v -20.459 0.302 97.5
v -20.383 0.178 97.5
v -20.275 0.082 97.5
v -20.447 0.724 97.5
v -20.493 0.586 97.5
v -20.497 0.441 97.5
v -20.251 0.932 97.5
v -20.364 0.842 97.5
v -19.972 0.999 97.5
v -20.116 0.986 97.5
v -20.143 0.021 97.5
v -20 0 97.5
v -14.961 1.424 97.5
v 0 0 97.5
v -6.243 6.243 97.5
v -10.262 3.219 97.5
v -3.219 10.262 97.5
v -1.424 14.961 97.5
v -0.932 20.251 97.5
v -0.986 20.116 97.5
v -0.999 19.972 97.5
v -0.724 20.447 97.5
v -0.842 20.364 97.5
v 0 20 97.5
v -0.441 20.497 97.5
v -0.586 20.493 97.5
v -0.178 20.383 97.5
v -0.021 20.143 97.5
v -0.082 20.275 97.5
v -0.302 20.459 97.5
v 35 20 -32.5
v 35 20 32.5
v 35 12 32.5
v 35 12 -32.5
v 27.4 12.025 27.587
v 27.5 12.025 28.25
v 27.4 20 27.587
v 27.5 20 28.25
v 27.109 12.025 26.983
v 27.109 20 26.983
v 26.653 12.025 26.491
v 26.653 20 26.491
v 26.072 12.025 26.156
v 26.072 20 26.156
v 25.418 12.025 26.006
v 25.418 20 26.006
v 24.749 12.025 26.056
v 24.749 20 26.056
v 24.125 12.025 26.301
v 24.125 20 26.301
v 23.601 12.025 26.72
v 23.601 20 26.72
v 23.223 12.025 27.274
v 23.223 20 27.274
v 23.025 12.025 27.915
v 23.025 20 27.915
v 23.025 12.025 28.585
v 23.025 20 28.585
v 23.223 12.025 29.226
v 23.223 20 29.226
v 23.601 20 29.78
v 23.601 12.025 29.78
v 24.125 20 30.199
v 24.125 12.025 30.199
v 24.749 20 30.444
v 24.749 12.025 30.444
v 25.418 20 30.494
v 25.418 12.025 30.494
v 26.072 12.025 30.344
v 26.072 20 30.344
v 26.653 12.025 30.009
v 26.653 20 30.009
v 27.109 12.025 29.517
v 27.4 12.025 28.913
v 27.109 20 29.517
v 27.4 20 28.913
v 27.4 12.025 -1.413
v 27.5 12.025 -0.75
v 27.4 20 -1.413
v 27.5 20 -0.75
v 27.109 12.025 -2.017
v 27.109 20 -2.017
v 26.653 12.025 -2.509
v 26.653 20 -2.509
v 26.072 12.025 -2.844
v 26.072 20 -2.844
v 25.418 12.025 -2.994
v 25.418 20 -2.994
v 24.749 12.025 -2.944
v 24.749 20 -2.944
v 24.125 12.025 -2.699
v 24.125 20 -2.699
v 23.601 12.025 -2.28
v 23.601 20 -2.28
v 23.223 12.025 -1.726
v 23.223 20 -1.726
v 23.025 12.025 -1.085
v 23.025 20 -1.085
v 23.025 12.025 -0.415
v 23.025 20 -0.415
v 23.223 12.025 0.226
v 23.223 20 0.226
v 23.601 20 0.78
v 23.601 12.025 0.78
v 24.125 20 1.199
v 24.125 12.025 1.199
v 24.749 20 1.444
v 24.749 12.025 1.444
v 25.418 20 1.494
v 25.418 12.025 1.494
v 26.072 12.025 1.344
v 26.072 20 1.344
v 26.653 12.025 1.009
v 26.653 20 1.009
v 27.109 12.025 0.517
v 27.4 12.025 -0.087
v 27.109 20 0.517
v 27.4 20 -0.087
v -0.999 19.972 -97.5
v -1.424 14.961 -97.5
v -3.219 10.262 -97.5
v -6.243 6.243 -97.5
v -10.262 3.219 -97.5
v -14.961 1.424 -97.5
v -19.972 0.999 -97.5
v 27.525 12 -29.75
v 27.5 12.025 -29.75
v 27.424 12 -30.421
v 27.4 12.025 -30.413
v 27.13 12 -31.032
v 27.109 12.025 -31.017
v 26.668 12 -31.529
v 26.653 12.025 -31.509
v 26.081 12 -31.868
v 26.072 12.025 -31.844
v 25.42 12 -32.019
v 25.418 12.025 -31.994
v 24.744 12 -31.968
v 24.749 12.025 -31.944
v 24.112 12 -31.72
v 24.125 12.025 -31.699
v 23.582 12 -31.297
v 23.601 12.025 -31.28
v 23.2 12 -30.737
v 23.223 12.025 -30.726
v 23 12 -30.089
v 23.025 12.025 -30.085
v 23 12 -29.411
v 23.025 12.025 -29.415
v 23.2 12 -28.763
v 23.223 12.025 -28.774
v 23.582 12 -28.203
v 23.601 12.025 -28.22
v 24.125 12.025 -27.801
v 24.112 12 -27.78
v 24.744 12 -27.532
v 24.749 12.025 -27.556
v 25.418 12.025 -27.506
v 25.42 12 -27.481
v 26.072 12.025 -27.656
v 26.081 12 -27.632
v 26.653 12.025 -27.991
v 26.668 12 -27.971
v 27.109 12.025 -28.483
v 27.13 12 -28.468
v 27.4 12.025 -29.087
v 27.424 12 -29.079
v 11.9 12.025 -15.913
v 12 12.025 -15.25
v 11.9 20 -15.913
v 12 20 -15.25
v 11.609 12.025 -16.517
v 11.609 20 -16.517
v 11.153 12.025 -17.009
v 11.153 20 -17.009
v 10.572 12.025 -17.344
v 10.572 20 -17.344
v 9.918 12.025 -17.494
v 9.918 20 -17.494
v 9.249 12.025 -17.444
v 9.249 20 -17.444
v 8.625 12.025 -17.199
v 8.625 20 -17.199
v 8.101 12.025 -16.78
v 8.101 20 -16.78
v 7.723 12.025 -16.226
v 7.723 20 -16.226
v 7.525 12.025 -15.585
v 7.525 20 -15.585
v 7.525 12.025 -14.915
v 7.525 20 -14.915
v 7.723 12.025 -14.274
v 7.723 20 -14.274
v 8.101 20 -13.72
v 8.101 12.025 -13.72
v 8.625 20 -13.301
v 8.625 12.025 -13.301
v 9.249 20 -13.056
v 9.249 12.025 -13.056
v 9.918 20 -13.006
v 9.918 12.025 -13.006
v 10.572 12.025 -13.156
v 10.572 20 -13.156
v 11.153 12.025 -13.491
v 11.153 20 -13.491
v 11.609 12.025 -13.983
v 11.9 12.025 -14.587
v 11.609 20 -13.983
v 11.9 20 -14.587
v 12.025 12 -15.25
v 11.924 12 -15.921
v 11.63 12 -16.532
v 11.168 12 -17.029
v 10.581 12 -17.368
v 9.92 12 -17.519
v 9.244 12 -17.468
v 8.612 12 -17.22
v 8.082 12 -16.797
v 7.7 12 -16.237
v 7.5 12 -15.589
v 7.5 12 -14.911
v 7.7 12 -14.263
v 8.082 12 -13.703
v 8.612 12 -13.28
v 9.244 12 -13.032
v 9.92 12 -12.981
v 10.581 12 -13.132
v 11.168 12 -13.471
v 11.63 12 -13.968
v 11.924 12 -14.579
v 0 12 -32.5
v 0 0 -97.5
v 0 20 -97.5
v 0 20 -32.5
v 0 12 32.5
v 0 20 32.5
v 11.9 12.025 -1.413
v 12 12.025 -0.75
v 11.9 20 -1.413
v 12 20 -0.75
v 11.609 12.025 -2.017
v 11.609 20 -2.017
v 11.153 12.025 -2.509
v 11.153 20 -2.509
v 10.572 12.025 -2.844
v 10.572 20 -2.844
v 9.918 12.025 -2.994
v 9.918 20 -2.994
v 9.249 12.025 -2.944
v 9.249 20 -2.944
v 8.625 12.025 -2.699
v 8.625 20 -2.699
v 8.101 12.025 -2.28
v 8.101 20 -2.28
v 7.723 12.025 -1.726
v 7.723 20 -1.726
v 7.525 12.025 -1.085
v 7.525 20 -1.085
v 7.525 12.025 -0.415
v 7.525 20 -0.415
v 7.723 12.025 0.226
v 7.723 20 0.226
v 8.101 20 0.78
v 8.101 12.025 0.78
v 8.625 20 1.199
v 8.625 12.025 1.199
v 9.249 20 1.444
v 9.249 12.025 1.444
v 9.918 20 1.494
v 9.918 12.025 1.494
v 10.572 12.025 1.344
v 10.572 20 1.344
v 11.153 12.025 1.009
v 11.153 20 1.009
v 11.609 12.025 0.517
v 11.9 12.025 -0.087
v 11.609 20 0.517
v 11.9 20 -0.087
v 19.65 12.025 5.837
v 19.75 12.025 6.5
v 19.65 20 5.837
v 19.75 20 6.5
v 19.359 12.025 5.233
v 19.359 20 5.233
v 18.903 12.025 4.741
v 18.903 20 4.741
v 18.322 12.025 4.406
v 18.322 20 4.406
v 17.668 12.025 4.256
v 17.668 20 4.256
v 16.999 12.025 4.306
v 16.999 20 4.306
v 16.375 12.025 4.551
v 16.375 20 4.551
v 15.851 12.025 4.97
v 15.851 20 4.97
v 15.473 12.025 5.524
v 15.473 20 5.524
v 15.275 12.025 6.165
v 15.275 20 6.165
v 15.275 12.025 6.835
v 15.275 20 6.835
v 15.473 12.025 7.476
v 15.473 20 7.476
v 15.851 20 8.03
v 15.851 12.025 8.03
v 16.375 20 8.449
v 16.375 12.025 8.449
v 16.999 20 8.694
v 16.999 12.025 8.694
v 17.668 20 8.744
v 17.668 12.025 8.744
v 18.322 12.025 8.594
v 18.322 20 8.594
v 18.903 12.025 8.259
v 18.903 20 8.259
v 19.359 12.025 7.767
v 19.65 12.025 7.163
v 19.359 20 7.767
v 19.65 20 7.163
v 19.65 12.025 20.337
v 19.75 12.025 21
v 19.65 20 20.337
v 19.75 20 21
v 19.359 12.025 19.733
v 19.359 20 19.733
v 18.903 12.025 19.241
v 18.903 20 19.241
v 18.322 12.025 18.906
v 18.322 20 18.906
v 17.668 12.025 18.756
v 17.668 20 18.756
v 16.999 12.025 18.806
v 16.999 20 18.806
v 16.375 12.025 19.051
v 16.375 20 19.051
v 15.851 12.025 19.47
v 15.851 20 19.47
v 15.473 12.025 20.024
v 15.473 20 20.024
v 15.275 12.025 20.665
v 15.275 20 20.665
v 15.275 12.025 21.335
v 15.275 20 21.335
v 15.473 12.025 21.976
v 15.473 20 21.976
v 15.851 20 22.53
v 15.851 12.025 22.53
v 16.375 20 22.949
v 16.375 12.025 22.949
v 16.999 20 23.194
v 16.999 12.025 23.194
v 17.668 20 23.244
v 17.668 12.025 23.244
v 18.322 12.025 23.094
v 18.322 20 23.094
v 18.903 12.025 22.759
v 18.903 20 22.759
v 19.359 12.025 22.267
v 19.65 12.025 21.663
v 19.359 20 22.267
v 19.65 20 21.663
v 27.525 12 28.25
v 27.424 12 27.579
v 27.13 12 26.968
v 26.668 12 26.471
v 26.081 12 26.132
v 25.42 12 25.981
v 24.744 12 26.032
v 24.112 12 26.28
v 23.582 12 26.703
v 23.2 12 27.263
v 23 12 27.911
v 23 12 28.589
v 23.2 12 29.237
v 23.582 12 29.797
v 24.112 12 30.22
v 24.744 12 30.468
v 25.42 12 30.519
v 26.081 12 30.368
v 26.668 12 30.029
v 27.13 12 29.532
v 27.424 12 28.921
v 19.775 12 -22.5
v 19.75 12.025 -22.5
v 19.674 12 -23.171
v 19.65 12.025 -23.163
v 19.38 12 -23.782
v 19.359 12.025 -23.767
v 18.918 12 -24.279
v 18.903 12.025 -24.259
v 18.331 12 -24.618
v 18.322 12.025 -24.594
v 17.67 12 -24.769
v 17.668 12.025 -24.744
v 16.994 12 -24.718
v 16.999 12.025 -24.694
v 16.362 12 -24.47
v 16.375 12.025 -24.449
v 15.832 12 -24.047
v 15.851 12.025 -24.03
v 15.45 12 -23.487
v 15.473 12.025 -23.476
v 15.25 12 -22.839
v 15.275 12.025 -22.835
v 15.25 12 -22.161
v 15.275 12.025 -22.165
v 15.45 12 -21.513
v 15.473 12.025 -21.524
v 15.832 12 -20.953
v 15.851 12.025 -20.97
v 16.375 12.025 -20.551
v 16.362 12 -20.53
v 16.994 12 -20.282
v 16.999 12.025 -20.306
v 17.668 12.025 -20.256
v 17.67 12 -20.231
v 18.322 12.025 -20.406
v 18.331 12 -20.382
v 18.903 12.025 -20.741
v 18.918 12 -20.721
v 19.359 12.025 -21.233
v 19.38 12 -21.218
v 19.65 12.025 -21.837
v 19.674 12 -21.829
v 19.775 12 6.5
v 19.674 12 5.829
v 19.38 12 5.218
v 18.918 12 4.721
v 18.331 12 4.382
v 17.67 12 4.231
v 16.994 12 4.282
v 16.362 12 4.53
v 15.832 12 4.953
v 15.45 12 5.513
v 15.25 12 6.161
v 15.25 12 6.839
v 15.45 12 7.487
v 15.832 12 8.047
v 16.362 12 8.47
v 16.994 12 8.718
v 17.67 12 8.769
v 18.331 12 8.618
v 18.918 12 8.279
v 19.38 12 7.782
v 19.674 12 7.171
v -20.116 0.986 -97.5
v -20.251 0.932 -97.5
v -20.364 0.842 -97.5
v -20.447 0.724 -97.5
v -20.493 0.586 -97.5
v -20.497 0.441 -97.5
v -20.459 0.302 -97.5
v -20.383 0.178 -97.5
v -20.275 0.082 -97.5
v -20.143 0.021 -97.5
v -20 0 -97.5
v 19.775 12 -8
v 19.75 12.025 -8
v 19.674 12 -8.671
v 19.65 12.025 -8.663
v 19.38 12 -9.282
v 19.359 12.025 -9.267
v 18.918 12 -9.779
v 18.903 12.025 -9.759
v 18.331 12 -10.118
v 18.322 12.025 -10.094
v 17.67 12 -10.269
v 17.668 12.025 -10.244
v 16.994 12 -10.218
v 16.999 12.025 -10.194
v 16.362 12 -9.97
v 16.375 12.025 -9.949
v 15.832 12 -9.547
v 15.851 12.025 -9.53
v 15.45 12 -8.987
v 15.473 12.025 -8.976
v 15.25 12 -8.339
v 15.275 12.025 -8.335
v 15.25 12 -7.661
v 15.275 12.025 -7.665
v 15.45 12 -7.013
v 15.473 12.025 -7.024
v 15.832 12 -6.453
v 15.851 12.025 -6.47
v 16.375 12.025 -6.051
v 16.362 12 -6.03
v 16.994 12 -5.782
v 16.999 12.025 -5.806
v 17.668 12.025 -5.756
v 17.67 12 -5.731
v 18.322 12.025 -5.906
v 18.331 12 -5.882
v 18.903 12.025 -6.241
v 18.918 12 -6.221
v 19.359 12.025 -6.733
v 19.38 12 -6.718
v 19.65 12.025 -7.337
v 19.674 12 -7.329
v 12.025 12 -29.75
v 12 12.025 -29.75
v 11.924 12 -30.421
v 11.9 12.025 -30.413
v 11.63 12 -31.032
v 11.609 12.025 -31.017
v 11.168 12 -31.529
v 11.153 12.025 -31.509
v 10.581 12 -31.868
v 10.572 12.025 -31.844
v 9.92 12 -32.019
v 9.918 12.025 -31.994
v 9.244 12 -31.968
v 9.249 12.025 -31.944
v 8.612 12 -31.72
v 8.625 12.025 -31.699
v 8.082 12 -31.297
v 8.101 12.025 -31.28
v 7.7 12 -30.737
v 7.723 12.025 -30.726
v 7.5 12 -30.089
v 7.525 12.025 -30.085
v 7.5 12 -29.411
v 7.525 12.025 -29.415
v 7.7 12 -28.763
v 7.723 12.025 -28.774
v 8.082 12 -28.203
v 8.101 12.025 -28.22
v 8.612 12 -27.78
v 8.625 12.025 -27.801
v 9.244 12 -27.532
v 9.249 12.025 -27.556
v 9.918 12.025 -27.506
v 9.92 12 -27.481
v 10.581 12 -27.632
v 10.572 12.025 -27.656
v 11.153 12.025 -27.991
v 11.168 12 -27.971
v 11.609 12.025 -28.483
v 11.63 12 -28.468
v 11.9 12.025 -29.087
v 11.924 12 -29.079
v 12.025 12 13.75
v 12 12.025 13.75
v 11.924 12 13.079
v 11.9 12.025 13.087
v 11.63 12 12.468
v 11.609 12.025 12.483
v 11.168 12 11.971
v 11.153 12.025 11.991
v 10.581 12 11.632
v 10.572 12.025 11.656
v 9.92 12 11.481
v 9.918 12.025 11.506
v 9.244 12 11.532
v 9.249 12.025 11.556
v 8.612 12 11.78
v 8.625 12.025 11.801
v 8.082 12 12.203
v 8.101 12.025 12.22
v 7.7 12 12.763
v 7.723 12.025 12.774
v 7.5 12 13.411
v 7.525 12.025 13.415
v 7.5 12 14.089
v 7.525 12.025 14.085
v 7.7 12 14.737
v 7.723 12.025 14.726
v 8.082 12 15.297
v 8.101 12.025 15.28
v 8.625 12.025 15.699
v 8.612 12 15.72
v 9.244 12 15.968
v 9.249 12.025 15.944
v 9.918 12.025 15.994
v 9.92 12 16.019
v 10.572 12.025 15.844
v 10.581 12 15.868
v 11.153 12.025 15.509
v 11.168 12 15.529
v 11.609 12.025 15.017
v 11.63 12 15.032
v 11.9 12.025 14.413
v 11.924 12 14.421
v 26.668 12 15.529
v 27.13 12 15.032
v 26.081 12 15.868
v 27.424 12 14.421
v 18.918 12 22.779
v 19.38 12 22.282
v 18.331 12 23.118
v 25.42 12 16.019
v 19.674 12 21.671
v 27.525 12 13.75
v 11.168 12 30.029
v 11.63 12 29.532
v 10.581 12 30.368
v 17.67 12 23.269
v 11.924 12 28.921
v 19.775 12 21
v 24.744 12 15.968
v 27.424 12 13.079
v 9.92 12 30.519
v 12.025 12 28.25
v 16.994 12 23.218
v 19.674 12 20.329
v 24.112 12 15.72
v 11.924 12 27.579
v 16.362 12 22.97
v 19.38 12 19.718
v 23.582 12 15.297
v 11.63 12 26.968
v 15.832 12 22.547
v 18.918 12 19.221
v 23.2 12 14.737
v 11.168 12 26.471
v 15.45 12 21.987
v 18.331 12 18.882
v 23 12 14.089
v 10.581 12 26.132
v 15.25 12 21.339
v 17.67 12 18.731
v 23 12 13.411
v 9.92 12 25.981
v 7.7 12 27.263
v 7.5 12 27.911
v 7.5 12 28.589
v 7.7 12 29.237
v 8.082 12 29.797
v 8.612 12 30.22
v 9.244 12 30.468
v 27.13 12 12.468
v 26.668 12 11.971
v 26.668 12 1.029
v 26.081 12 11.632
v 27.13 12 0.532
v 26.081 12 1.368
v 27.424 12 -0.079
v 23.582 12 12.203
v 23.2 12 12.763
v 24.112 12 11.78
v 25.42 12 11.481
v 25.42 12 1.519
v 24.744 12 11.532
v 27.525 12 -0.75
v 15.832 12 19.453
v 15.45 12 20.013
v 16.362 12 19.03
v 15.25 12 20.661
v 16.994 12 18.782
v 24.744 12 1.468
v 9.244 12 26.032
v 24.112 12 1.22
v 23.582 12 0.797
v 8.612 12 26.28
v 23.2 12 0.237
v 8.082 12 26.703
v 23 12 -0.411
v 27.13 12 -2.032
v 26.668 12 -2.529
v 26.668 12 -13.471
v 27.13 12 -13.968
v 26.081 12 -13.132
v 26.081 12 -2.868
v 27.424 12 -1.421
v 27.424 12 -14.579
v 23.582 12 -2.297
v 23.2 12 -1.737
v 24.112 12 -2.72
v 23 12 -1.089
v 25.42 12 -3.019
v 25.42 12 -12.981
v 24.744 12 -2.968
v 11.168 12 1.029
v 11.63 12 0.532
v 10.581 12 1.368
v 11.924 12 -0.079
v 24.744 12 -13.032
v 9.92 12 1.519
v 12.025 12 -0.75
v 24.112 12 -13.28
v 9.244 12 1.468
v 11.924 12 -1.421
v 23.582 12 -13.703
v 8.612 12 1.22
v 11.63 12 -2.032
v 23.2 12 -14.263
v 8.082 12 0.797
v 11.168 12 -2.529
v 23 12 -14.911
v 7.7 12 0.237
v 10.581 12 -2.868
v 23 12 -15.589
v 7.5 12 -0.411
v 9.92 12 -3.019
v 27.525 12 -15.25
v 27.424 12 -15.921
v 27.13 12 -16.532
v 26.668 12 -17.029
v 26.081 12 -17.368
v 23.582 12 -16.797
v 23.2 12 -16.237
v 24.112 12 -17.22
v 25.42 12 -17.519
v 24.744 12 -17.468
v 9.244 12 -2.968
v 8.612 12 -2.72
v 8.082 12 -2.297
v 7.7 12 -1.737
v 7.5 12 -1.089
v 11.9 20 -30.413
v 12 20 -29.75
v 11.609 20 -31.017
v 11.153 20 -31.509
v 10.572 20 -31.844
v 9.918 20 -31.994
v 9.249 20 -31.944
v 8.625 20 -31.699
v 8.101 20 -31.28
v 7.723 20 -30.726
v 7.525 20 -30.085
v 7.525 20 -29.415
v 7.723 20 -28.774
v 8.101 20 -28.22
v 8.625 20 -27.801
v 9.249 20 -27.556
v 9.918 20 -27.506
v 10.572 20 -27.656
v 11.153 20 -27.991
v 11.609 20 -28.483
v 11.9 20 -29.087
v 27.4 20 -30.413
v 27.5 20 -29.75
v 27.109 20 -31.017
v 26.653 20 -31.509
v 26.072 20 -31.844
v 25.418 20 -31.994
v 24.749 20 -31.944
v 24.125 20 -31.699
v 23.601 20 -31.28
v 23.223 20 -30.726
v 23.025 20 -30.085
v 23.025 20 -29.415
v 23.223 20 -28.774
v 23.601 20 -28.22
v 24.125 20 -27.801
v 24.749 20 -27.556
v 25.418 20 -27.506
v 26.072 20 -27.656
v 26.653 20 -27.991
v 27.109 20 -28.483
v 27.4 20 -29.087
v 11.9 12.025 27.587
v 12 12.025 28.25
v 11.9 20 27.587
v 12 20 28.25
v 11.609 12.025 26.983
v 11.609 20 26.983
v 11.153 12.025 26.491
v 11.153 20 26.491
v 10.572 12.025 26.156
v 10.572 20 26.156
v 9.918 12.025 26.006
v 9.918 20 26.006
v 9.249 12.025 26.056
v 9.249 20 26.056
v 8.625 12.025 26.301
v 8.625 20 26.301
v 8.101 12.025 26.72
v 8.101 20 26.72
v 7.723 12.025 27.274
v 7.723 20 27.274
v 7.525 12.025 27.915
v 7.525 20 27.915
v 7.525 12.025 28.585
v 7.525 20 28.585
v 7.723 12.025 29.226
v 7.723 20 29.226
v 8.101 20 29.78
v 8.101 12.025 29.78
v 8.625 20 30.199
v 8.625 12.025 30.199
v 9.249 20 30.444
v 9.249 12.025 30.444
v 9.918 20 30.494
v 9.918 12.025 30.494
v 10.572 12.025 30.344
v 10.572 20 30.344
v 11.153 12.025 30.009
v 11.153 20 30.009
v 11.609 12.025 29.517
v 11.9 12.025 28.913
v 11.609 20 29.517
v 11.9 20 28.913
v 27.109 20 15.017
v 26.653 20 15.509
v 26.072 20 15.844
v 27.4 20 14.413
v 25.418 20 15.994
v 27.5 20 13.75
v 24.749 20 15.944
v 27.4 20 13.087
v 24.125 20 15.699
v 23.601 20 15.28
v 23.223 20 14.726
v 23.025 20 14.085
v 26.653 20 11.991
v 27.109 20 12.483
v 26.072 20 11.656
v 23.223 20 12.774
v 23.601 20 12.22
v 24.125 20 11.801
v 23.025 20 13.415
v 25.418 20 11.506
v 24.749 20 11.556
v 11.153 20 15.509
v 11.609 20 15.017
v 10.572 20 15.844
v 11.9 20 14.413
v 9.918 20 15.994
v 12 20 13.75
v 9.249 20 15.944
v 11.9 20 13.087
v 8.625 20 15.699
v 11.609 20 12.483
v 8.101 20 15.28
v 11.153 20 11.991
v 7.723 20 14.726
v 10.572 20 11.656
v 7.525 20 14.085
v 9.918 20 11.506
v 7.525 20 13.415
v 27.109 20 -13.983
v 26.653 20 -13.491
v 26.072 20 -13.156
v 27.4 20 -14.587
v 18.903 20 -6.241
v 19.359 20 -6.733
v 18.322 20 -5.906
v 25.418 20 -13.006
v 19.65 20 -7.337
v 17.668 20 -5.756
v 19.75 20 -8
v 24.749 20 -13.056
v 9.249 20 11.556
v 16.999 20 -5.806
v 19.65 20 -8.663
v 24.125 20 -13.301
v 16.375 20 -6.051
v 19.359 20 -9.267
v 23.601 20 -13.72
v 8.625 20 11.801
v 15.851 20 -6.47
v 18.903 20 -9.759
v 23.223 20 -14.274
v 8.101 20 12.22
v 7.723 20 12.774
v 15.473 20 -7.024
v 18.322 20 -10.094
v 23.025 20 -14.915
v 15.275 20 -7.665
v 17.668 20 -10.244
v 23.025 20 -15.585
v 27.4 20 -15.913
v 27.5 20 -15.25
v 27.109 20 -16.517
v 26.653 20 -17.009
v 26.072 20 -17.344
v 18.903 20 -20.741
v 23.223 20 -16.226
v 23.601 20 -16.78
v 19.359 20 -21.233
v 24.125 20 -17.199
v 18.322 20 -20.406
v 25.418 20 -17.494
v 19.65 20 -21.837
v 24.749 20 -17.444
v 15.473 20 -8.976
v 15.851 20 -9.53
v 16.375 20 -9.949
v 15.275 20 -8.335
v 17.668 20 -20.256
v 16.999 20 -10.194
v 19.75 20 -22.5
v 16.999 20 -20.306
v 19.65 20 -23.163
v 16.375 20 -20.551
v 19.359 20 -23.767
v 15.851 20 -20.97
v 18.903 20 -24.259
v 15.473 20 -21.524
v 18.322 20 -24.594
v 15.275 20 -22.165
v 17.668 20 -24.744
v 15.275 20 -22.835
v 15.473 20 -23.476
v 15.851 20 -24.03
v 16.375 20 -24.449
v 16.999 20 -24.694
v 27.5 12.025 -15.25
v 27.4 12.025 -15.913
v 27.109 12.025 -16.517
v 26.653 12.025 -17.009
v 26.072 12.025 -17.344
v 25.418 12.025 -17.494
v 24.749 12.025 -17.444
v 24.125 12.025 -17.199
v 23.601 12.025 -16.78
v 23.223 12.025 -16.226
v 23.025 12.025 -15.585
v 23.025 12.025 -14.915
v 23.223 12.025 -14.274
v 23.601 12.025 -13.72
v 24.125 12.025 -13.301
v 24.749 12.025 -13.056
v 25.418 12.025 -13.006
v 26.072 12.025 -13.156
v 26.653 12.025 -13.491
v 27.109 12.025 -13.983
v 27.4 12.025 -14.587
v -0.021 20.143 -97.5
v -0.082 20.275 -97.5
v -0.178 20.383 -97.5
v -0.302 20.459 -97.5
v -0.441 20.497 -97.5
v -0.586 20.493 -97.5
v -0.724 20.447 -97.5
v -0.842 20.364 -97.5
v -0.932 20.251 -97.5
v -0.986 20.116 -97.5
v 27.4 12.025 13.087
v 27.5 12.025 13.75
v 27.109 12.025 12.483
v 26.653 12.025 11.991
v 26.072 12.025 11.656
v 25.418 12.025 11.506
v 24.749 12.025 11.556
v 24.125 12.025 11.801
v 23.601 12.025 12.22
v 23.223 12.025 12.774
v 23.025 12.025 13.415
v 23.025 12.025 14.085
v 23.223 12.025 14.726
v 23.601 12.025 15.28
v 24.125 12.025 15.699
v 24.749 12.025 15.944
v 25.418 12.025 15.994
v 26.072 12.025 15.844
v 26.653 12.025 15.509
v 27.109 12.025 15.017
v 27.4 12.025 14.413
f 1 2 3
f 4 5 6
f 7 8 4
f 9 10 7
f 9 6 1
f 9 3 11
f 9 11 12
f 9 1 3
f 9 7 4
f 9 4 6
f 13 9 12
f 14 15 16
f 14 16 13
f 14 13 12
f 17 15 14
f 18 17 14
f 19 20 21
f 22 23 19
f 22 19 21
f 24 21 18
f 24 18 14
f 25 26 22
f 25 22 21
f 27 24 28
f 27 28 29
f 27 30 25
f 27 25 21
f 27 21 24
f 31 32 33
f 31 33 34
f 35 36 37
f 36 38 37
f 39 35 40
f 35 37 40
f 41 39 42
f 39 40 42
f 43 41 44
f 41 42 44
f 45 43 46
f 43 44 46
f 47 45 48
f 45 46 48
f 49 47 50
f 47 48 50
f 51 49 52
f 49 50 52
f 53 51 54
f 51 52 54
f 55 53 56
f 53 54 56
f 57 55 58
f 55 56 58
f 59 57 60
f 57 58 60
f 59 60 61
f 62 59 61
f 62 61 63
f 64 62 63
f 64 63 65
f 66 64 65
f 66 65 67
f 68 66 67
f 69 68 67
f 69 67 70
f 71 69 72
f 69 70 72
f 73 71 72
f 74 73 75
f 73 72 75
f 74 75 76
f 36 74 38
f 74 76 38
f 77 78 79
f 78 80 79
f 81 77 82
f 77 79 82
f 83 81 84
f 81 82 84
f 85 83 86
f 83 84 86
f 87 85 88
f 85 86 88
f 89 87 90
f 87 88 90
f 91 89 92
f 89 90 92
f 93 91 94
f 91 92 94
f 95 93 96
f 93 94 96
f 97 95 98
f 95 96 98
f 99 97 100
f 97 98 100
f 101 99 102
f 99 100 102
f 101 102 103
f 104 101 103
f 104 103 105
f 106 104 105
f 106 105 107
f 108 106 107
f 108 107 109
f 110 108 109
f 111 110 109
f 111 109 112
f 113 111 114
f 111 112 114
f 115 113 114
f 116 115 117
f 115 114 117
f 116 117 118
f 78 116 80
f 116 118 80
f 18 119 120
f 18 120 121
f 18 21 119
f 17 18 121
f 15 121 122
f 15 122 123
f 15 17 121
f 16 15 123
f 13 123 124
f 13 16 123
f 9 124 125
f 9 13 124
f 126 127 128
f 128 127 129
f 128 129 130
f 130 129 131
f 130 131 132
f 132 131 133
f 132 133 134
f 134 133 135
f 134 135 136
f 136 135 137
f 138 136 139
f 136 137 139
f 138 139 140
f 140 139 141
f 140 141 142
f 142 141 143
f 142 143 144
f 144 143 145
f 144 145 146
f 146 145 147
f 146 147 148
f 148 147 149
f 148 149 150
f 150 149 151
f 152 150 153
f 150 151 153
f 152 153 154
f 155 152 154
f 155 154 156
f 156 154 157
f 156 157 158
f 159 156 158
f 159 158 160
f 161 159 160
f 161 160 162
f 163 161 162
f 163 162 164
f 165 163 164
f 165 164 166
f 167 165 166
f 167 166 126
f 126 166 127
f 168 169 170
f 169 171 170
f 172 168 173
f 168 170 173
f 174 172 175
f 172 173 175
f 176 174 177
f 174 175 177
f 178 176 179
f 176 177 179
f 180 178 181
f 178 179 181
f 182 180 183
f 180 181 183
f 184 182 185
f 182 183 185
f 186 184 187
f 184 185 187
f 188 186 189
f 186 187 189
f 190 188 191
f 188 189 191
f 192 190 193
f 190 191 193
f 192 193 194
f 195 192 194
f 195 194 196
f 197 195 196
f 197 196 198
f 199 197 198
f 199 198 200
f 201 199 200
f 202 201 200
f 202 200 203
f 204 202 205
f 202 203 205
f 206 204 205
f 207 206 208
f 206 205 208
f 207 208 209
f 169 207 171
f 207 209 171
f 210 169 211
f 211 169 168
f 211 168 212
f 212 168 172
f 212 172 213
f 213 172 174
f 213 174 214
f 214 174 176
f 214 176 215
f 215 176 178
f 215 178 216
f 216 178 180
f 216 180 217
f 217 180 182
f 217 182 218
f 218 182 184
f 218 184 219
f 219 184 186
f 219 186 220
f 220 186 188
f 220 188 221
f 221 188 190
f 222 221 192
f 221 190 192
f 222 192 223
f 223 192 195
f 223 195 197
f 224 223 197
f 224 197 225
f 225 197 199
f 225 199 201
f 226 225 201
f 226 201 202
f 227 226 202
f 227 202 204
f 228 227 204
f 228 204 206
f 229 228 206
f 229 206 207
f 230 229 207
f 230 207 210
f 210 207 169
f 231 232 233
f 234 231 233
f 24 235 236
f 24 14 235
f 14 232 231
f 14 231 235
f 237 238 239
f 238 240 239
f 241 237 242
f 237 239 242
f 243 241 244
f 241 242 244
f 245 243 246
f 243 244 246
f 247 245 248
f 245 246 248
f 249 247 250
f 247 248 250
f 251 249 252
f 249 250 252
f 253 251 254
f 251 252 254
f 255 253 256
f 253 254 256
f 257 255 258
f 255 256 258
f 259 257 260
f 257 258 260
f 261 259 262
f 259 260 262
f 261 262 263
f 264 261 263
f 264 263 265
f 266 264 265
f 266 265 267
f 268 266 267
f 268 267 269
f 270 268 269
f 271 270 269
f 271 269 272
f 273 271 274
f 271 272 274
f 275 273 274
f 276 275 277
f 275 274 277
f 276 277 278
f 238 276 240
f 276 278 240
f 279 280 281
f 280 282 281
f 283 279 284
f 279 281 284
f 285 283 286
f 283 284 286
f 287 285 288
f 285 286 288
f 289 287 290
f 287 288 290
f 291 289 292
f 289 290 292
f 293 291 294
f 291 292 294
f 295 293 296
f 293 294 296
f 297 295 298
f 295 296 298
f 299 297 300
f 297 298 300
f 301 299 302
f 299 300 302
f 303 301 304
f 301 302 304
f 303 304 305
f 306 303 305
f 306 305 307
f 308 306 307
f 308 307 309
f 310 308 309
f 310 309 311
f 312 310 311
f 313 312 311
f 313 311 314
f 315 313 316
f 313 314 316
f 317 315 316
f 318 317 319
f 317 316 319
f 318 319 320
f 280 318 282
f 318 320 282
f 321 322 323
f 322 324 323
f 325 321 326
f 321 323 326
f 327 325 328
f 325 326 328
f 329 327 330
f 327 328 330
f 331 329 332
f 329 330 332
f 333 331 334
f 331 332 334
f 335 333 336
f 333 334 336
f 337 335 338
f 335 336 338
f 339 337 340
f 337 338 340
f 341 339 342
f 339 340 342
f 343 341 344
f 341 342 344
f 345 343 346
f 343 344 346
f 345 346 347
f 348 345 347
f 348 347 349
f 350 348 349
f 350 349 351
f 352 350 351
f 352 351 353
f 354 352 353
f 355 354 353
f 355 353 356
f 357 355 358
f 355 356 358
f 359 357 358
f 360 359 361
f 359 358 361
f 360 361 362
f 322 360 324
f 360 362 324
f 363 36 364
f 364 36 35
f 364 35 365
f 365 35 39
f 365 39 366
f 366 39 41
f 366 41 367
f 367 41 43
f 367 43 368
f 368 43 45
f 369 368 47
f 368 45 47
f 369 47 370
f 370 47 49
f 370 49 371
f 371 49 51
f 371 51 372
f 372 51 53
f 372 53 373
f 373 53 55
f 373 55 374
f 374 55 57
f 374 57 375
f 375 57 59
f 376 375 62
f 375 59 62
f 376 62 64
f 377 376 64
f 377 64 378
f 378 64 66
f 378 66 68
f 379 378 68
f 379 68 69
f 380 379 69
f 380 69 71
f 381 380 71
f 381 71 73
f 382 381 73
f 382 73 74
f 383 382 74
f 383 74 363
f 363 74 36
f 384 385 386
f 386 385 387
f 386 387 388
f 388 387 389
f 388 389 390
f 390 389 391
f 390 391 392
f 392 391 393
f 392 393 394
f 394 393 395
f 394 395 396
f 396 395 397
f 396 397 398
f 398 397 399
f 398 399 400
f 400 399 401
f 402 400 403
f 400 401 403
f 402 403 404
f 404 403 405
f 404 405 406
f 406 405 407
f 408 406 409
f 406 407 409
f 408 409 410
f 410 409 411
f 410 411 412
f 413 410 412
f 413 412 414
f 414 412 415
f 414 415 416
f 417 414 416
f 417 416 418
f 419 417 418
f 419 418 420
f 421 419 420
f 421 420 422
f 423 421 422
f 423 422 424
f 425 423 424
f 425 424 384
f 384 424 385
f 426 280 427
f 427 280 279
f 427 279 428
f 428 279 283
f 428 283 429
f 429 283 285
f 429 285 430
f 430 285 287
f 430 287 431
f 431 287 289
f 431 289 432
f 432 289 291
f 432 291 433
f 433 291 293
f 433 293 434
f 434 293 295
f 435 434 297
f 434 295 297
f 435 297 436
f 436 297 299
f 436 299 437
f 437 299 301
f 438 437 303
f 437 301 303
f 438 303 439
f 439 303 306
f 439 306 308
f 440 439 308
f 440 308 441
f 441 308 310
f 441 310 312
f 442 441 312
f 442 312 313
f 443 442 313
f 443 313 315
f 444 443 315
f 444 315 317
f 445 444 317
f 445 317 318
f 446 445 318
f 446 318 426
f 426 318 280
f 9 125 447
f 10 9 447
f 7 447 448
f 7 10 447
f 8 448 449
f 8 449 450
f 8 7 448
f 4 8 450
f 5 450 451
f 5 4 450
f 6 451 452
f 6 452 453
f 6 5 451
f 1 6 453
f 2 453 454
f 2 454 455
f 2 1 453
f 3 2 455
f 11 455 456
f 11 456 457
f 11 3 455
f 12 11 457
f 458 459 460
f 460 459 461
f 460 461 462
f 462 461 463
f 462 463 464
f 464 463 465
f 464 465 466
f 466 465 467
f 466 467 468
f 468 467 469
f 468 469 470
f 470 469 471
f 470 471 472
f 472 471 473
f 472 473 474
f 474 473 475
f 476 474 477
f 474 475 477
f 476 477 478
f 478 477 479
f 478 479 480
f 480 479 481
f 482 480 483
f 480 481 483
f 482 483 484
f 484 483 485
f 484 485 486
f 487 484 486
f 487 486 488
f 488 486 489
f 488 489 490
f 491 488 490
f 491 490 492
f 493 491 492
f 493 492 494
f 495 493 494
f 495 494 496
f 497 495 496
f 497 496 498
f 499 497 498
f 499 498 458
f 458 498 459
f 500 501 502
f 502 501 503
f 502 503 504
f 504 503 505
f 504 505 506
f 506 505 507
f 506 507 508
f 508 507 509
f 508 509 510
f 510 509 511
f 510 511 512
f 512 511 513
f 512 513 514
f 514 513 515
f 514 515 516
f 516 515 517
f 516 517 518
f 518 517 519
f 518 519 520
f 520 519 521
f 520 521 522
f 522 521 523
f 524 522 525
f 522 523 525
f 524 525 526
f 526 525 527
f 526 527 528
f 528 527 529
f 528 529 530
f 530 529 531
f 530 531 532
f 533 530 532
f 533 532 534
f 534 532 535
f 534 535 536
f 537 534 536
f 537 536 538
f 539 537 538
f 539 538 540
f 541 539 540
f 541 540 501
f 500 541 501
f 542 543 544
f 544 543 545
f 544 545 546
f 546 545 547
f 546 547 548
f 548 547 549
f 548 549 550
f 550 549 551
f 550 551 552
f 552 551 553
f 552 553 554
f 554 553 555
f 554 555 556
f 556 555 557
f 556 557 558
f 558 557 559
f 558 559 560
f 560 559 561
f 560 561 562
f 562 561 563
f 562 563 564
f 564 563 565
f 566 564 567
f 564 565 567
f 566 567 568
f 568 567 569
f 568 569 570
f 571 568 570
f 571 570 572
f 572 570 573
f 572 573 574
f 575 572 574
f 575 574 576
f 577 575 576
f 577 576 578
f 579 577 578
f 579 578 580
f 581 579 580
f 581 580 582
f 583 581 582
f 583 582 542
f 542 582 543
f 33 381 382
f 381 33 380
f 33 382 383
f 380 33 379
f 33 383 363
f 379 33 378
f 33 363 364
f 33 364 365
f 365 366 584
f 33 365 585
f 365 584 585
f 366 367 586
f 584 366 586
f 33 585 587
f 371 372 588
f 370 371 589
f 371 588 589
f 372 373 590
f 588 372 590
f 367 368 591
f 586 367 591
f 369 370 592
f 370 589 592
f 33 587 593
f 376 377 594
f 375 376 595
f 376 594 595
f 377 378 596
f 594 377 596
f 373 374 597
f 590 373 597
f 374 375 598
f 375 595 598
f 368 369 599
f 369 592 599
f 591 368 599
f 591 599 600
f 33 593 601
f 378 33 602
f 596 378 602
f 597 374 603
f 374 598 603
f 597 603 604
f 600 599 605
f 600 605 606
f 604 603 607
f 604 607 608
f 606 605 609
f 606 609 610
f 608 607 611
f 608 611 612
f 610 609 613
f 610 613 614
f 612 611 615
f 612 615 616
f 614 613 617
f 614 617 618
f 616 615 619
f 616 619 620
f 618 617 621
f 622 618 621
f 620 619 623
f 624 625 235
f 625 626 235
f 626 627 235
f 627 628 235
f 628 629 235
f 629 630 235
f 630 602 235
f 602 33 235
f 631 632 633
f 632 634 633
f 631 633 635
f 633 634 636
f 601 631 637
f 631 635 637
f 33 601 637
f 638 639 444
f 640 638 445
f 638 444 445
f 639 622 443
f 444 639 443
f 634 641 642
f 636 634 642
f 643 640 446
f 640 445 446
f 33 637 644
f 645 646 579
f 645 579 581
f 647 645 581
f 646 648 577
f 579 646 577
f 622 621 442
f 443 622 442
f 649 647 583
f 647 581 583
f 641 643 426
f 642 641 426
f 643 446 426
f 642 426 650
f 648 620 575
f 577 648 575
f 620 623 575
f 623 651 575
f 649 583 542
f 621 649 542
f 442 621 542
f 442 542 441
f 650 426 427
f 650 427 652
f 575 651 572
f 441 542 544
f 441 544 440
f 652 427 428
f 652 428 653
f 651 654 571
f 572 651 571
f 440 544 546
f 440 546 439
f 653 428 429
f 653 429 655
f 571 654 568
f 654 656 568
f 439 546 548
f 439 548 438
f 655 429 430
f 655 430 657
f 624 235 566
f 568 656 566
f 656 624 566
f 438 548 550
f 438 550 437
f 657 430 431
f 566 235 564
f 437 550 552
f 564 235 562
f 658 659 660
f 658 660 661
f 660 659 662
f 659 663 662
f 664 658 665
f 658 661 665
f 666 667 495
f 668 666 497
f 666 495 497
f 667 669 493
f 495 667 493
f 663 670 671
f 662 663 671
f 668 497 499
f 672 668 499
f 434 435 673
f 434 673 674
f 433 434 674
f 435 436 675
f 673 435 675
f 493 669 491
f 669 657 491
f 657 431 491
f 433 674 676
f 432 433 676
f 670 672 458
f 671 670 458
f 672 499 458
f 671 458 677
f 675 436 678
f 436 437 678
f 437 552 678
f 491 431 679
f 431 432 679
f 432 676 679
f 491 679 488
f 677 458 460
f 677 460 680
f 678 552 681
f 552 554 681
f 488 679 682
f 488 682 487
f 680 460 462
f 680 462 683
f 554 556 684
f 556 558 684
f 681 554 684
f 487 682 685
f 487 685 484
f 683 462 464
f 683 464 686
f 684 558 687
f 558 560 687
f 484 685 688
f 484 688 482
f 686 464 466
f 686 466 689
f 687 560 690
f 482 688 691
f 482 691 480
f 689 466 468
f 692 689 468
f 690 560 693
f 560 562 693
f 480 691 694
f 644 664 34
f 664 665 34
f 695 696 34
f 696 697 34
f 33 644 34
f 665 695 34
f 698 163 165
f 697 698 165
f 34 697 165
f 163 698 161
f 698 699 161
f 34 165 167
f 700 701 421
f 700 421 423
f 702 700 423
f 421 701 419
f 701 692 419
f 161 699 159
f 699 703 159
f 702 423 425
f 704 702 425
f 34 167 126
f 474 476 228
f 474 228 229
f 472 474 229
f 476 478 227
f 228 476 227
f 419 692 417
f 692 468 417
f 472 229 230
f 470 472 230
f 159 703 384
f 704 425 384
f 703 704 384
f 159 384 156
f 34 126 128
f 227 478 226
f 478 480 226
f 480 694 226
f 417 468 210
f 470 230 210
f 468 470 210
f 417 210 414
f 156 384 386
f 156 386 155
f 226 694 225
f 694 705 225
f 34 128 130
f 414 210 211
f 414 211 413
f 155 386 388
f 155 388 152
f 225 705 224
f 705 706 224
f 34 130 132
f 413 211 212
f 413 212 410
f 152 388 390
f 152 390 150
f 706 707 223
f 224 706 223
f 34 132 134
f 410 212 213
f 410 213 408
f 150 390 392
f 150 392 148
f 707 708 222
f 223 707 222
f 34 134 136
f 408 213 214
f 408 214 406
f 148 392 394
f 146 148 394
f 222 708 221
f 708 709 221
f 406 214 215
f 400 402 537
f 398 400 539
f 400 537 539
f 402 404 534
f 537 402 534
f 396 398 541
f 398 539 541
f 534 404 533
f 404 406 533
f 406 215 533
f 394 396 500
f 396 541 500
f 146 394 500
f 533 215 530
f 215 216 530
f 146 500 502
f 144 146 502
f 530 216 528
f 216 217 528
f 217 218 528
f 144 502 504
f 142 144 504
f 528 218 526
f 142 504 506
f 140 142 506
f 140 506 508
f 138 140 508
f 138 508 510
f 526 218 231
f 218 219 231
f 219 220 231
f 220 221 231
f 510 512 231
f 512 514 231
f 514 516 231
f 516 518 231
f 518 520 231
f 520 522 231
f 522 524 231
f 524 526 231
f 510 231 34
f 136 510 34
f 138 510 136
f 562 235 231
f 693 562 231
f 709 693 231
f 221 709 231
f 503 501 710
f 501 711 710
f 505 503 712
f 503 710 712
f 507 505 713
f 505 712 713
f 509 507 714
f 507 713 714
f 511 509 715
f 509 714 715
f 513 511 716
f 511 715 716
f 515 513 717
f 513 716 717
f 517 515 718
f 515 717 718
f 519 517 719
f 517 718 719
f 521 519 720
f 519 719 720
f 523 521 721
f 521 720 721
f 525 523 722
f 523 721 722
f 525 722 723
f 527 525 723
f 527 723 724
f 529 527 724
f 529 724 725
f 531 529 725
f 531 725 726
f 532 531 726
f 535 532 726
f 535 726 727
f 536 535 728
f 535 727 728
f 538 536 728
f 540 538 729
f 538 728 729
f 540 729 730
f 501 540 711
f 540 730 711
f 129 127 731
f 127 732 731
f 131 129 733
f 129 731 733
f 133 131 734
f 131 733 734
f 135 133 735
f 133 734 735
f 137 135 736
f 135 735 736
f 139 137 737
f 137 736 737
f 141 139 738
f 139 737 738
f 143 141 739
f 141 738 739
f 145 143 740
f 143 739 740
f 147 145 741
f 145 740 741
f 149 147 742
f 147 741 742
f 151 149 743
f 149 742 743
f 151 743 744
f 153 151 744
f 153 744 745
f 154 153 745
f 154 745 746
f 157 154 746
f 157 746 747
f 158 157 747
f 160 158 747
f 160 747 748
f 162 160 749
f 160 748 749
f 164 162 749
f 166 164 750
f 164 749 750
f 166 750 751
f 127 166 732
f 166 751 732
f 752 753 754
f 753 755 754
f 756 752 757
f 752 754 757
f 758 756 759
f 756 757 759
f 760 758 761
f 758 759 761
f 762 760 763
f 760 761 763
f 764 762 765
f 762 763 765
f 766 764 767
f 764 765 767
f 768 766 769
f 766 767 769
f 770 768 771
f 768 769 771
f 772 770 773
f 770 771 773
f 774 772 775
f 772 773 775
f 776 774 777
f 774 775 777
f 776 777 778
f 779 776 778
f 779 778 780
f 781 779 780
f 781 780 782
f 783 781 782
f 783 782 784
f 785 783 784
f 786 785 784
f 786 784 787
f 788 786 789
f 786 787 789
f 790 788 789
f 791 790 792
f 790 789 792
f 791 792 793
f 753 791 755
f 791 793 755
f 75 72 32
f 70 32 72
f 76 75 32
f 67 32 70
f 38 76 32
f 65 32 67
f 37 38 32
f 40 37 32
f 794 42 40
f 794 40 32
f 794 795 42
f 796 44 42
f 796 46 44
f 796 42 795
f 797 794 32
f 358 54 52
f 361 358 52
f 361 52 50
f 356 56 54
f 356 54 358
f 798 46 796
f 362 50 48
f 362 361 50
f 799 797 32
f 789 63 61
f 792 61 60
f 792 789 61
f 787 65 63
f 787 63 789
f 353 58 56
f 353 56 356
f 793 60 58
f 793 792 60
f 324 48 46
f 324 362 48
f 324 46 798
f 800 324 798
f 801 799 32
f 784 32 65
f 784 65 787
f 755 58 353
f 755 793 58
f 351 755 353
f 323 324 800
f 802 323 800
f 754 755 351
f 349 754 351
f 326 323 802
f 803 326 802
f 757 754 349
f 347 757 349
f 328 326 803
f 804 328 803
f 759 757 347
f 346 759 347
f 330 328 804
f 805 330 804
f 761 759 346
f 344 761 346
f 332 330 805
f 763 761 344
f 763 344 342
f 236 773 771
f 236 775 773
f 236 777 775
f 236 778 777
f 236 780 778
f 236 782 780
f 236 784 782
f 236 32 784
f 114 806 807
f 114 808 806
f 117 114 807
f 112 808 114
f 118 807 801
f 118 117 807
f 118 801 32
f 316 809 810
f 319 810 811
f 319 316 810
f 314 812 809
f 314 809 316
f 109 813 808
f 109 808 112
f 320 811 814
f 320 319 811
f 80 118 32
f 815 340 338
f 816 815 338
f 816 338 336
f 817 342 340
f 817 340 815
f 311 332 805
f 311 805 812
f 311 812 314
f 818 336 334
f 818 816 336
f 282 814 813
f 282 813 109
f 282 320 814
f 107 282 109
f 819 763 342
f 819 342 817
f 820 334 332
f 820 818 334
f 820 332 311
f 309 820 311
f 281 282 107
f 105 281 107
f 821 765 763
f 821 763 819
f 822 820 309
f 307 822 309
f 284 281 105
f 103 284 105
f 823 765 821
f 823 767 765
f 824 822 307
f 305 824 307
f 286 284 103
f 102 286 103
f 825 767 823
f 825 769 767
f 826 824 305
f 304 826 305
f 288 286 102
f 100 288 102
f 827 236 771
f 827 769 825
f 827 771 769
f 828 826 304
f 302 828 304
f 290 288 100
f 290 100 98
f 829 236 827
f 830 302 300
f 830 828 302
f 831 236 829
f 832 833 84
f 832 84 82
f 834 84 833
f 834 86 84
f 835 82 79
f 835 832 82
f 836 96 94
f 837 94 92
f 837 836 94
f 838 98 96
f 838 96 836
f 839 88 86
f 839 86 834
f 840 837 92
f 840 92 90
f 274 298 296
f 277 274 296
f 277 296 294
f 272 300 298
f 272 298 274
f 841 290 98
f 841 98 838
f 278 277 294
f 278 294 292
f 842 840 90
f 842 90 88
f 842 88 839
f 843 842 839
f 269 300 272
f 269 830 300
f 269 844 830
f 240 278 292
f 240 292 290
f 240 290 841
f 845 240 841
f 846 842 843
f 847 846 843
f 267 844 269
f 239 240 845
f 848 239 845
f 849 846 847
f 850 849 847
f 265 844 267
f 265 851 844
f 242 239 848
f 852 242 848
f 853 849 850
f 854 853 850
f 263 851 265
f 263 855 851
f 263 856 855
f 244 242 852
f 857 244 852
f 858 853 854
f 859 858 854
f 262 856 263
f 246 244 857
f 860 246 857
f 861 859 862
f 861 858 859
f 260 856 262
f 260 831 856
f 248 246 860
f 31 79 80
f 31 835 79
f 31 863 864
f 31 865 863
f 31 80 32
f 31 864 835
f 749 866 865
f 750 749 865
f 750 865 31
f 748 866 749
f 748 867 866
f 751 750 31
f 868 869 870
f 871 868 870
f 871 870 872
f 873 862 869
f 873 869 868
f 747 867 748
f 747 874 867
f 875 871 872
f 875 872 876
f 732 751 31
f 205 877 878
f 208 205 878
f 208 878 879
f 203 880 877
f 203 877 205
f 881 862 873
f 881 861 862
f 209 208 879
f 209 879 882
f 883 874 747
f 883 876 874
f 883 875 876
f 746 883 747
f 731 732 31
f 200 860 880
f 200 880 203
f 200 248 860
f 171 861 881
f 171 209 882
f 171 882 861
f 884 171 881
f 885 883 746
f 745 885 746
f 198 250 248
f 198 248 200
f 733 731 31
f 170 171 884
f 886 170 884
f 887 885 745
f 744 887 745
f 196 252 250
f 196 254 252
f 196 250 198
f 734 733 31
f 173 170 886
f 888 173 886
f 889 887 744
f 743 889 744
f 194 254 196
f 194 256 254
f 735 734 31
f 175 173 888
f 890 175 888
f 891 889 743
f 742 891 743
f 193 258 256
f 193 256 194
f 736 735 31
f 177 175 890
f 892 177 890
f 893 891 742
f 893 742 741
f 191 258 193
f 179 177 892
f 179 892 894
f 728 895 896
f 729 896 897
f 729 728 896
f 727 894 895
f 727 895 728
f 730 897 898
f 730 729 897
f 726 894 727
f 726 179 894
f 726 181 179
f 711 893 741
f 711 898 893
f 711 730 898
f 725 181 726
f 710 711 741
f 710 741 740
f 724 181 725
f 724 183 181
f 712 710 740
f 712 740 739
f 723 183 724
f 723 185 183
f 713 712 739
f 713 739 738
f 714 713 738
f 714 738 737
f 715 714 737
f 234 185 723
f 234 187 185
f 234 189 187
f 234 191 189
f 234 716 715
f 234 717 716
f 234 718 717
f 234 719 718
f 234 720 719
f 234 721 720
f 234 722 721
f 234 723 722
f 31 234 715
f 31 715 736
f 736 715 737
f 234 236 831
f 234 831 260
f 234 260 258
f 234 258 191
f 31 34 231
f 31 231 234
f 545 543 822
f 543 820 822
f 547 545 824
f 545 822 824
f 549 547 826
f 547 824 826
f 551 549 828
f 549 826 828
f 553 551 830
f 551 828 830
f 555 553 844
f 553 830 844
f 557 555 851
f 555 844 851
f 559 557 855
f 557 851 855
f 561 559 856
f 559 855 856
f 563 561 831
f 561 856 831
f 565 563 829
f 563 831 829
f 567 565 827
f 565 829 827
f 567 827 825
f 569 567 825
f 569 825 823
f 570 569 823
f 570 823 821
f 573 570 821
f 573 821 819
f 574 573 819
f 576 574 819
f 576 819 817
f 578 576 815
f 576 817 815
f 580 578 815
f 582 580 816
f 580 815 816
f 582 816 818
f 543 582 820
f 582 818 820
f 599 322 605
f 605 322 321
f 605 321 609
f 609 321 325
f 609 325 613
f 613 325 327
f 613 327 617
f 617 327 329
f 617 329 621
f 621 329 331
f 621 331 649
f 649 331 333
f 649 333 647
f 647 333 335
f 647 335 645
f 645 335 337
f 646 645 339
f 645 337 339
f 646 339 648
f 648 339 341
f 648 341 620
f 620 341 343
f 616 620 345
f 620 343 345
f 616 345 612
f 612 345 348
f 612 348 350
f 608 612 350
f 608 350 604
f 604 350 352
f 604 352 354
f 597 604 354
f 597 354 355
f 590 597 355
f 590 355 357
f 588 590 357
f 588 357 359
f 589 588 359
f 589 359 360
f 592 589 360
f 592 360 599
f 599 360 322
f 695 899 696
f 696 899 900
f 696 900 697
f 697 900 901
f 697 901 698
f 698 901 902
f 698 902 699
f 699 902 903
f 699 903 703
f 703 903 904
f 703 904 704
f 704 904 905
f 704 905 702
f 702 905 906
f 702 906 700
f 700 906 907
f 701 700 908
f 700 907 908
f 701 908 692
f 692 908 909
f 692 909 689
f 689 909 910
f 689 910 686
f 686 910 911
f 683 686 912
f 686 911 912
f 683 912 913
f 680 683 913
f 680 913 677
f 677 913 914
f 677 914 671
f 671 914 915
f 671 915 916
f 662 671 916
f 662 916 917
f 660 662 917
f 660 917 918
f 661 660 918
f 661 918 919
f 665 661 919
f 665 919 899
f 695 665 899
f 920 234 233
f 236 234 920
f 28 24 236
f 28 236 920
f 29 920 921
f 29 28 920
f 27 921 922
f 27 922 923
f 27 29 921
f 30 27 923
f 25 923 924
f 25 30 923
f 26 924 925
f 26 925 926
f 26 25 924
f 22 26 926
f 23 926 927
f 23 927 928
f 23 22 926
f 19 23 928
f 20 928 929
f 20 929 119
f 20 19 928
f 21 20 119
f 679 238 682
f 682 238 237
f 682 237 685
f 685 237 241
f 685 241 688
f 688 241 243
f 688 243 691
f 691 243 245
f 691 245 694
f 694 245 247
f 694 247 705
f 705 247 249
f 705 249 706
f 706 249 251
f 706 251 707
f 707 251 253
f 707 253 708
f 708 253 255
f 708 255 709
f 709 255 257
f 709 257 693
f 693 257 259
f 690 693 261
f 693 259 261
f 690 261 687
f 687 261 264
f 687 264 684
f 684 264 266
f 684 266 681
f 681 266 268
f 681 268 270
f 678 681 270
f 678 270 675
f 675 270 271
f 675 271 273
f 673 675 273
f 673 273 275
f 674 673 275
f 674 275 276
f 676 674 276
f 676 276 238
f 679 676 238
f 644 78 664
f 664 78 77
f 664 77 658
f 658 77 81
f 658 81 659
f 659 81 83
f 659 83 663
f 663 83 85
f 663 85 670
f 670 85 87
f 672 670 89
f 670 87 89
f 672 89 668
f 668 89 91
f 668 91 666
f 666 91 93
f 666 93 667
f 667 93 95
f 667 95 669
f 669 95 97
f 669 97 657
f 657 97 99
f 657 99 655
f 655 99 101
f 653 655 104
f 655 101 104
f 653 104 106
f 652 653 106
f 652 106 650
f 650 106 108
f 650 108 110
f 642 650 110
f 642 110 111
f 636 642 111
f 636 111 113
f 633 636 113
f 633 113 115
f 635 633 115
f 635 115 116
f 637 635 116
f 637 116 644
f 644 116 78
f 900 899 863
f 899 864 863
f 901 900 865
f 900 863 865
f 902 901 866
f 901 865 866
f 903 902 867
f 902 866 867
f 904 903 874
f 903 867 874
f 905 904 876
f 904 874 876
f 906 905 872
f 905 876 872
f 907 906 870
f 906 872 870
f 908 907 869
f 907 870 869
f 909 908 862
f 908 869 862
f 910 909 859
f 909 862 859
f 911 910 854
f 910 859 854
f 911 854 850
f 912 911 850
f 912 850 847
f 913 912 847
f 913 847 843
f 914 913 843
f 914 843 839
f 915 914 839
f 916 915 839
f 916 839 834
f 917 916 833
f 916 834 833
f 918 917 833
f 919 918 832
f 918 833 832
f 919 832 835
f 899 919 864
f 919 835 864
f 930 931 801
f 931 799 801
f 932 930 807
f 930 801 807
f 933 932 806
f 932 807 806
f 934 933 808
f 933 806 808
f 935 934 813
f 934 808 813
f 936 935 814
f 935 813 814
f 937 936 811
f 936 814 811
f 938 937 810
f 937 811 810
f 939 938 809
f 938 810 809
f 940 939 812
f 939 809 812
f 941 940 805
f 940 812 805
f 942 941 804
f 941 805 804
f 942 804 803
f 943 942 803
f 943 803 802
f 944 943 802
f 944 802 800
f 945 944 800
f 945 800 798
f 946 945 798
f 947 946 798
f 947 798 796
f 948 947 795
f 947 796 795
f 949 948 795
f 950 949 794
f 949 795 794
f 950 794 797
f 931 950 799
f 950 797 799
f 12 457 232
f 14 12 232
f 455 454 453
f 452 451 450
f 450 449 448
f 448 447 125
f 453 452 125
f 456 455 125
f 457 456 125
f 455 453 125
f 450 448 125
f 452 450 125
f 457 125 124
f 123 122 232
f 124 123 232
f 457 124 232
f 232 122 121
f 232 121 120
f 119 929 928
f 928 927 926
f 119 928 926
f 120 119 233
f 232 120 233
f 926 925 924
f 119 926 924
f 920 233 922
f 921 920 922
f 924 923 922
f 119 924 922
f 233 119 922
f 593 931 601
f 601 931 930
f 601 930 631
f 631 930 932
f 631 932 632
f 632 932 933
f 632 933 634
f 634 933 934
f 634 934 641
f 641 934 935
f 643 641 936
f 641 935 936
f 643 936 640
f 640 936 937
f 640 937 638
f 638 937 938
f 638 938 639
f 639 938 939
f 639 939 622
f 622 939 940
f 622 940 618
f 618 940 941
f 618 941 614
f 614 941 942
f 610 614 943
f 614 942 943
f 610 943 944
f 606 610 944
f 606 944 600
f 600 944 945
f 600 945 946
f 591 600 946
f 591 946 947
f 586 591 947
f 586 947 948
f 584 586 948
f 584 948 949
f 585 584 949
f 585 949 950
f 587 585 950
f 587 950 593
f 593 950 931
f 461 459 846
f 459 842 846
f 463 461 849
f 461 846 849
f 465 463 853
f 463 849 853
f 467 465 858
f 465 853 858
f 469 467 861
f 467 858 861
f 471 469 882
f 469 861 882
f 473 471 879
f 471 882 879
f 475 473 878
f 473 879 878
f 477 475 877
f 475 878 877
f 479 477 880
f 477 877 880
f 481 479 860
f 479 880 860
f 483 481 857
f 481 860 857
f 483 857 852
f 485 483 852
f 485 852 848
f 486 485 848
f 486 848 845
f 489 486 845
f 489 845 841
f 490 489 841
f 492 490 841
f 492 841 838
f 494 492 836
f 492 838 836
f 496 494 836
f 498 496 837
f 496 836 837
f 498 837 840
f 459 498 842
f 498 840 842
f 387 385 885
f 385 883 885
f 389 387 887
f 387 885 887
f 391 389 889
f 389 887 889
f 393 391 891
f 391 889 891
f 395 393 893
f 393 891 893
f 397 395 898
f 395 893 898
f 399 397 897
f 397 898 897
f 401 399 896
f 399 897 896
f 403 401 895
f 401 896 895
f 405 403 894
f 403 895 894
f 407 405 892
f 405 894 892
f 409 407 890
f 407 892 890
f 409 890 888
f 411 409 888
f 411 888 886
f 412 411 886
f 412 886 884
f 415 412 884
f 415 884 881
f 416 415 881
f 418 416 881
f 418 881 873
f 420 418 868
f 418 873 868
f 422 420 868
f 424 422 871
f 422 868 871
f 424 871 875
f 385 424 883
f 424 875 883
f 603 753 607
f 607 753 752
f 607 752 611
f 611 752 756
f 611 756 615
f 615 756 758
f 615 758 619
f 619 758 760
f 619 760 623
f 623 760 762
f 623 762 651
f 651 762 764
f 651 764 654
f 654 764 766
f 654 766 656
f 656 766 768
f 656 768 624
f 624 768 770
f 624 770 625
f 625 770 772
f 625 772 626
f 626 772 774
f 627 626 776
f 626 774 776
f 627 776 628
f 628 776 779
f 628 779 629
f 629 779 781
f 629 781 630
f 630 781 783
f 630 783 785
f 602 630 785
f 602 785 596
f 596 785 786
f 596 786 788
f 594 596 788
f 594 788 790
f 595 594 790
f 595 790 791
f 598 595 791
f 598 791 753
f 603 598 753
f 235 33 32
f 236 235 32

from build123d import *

# Parameters (mm, degrees)
SALIENTE_EXTRUIR1_DEPTH                = 97.5
CROQUIS2_W                             = 65
CROQUIS2_H                             = 8
SALIENTE_EXTRUIR2_DEPTH                = 35
TALADRO_DE_MARGEN_PARA_M41_D           = 4.5
TALADRO_DE_MARGEN_PARA_M41_CSINK_D     = 4.55
TALADRO_DE_MARGEN_PARA_M41_CSINK_ANGLE = 90


with BuildPart() as part:
    # Croquis1 → Saliente-Extruir1 (new, symmetric)
    with BuildSketch(Plane.XY):
        with BuildLine():
            Line((-20, 0), (0, 0))
            Line((0, 0), (0, 20))
            ThreePointArc((0, 20), (-0.513905625, 20.499806596), (-0.999226534, 19.972199507))
            ThreePointArc((-0.999226534, 19.972199507), (-6.24345971, 6.24345971), (-19.972199507, 0.999226534))
            ThreePointArc((-19.972199507, 0.999226534), (-20.499806596, 0.513905625), (-20, 0))
        make_face()
    extrude(amount=SALIENTE_EXTRUIR1_DEPTH, both=True)

    # Croquis2 → Saliente-Extruir2 (add)
    with BuildSketch(Plane(origin=(0, 0, 0), x_dir=(0, 0, -1), z_dir=(1, 0, 0))):
        with Locations((0, 16)):
            Rectangle(CROQUIS2_W, CROQUIS2_H)
    extrude(amount=SALIENTE_EXTRUIR2_DEPTH)

    # Taladro de margen para M41 (through all)
    with Locations(Plane(origin=(0, 12, 0), x_dir=(-1, 0, 0), z_dir=(0, -1, 0))):
        with Locations((-9.75, -28.25), (-25.25, -28.25), (-25.25, -13.75), (-17.5, -21), (-9.75, -13.75), (-9.75, 0.75), (-25.25, 0.75), (-17.5, -6.5), (-17.5, 8), (-9.75, 15.25), (-25.25, 15.25), (-9.75, 29.75), (-17.5, 22.5), (-25.25, 29.75)):
            CounterSinkHole(TALADRO_DE_MARGEN_PARA_M41_D / 2, TALADRO_DE_MARGEN_PARA_M41_CSINK_D / 2, counter_sink_angle=TALADRO_DE_MARGEN_PARA_M41_CSINK_ANGLE)


solid = part.part
